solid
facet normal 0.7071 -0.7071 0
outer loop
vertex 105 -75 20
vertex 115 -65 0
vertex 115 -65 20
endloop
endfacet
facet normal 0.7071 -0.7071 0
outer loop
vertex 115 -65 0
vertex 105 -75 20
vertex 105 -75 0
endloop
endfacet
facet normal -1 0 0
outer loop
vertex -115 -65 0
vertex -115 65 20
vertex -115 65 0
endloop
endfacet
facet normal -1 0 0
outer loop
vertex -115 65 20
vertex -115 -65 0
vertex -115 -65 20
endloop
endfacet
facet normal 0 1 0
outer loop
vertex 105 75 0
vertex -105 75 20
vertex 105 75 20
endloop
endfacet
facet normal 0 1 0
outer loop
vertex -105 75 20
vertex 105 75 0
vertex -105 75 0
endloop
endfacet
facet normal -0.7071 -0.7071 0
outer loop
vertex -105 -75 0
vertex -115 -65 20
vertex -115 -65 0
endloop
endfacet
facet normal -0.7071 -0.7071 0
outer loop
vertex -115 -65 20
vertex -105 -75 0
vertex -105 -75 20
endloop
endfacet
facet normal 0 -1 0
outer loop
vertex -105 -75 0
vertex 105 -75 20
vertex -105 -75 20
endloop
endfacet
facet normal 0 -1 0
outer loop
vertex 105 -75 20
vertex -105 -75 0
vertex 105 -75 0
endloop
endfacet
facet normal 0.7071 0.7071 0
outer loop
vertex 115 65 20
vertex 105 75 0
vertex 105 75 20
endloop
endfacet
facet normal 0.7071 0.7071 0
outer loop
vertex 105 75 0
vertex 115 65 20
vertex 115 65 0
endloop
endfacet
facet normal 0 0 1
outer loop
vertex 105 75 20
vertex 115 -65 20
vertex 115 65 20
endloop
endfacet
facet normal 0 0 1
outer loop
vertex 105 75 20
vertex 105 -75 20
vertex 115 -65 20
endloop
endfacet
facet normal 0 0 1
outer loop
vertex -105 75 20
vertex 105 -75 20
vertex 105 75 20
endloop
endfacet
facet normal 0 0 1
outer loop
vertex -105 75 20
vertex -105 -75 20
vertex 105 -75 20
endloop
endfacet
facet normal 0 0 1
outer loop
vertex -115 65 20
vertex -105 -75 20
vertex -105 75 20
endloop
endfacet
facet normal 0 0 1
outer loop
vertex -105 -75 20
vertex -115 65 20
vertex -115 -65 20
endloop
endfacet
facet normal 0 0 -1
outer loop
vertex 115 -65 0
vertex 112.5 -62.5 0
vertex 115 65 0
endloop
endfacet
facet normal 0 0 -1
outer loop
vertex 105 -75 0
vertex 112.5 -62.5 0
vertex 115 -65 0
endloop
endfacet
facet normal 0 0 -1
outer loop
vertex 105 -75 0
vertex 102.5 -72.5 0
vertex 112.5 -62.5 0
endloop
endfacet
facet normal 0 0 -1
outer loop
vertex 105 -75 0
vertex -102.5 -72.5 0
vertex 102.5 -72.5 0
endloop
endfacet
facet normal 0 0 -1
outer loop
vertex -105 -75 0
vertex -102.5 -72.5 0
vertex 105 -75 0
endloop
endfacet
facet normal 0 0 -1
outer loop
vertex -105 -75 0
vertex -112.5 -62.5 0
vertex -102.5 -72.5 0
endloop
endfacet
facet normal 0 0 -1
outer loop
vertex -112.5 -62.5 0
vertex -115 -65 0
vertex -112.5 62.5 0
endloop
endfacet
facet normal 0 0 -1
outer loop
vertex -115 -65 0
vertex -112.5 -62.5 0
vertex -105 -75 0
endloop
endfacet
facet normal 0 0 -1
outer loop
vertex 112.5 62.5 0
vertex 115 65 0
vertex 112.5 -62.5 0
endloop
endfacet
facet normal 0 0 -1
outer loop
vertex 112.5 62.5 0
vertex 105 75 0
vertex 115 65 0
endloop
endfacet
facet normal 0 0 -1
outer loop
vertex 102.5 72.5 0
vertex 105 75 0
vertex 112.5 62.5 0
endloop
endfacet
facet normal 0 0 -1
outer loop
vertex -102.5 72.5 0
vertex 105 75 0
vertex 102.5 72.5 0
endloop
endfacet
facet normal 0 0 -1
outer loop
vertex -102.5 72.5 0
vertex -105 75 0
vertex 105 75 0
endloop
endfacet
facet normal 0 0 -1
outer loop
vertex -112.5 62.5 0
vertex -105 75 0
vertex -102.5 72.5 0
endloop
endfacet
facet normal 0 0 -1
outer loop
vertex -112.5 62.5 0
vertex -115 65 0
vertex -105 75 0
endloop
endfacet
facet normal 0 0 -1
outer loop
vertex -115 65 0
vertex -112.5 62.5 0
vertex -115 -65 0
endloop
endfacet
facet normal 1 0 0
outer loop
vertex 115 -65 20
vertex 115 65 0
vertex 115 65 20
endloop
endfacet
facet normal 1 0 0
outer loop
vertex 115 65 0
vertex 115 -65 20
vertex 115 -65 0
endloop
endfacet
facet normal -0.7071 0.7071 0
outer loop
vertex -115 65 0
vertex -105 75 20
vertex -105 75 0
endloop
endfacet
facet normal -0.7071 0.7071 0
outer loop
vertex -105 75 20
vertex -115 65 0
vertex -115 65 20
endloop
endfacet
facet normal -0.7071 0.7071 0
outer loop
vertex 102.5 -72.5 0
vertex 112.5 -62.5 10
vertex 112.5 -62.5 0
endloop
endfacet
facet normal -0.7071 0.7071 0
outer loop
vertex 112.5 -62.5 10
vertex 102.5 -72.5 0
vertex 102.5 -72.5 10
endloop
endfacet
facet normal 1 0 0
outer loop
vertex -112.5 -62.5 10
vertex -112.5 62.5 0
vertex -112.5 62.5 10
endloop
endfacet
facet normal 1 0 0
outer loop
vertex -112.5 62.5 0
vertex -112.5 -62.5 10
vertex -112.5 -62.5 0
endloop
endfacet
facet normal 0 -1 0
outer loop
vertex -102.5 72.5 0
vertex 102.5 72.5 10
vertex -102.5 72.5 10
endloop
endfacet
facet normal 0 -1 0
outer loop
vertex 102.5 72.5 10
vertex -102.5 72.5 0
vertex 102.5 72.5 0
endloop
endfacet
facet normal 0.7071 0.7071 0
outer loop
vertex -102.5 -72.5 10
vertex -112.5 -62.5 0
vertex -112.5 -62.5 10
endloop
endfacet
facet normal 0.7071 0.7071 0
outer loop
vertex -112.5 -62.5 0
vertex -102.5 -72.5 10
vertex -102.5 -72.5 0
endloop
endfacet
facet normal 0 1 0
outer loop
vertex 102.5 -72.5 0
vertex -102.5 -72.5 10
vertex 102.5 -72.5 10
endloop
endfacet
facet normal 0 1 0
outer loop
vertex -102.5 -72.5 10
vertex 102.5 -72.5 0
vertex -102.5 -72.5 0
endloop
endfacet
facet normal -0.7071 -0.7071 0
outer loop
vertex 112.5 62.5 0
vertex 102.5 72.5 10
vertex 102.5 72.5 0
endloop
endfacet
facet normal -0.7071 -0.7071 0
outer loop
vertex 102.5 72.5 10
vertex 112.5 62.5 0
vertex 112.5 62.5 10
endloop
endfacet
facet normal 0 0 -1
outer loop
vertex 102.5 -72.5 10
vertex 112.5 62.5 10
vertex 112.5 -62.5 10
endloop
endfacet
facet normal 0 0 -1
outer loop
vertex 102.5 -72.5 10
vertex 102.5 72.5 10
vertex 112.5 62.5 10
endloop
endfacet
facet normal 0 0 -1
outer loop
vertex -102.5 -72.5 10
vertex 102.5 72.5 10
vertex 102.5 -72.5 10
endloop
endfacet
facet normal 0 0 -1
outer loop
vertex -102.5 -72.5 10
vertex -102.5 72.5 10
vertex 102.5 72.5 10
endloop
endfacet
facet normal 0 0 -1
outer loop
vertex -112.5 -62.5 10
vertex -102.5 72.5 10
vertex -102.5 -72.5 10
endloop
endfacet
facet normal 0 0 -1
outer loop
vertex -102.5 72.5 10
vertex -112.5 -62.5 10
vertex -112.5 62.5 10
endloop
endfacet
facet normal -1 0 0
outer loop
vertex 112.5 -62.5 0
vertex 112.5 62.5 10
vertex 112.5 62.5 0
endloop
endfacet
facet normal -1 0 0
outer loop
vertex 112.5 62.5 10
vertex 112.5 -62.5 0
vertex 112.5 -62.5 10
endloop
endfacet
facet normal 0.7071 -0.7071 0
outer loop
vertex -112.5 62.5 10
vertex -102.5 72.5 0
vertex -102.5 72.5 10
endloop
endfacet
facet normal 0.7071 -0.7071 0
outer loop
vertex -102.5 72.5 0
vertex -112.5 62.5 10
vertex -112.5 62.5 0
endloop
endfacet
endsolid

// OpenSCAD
// file: base.scad
/// Creates a base for a fight stick.
/// `corner_length` is the size of the corners
/// `box_width` is the width of the box
/// `box_height` is the height of the box
module base(corner_length = 10, box_width = 220, box_height = 140) {
    module corner() {
        points = [
            [0,0],
            [0,corner_length],
            [corner_length,corner_length],
        ];

        translate([-corner_length / 2, -corner_length / 2,0])
        polygon(points);
    }

    module edge() {   
        // Corner 1
        mirror([1,0,0])
        translate([box_width / 2, 0,0])
        corner();

        // Connector
        connector_width = box_width - 1 * corner_length;

        translate([-connector_width / 2, -corner_length / 2,0])
        polygon([
        [0,0],
        [connector_width,0],
        [connector_width, corner_length],
        [0, corner_length]
        ]);


        // Corner 2
        translate([box_width / 2, 0,0])
        corner();

    }

    module fill() {
        fill_width = box_width + corner_length;
        fill_height = box_height - corner_length;

        translate([-fill_width / 2, -fill_height / 2,0])
        polygon([
            [0,0],
            [fill_width,0],
            [fill_width, fill_height],
            [0, fill_height]
        ]);
    }

    // Bottom side
    translate([0, -box_height / 2,0])
    edge();

    // Top side
    mirror([0,1,0])
    translate([0, -box_height / 2,0])
    edge();

    // Fill it all
    fill();
}
// main file
/*
This is a generic top for the fight stick.
*/

include <base.scad>;


/// Creates a generic top for the hitbox
/// `corner_length` is the size of the corners
/// `box_width` is the width of the box
/// `box_height` is the height of the box
/// `box_depth` is the depth of the box
/// `wall_thickness` is the thickness of the walls
/// `face_thickness` is the thickness of the top/face
module top(
    corner_length = 10, 
    box_width = 220, 
    box_height = 140, 
    box_depth = 20, 
    wall_thickness = 5,
    face_thickness = 10,
    ) {
    face_thickness = max(1, face_thickness);
       
    difference() {            
        // Set up the 'shell' which is the absolute size of the box.
        linear_extrude(height = box_depth)
        base(corner_length = corner_length, box_width = box_width, box_height = box_height);
        
        // Do a cut out for the inside
        color([1,0,0,1])
        linear_extrude(height = box_depth - face_thickness)
        base(
            corner_length = corner_length, 
            box_width = box_width  - wall_thickness, 
            box_height = box_height  - wall_thickness
        );
    }
}


// TODO: this can probably be changed
top();
